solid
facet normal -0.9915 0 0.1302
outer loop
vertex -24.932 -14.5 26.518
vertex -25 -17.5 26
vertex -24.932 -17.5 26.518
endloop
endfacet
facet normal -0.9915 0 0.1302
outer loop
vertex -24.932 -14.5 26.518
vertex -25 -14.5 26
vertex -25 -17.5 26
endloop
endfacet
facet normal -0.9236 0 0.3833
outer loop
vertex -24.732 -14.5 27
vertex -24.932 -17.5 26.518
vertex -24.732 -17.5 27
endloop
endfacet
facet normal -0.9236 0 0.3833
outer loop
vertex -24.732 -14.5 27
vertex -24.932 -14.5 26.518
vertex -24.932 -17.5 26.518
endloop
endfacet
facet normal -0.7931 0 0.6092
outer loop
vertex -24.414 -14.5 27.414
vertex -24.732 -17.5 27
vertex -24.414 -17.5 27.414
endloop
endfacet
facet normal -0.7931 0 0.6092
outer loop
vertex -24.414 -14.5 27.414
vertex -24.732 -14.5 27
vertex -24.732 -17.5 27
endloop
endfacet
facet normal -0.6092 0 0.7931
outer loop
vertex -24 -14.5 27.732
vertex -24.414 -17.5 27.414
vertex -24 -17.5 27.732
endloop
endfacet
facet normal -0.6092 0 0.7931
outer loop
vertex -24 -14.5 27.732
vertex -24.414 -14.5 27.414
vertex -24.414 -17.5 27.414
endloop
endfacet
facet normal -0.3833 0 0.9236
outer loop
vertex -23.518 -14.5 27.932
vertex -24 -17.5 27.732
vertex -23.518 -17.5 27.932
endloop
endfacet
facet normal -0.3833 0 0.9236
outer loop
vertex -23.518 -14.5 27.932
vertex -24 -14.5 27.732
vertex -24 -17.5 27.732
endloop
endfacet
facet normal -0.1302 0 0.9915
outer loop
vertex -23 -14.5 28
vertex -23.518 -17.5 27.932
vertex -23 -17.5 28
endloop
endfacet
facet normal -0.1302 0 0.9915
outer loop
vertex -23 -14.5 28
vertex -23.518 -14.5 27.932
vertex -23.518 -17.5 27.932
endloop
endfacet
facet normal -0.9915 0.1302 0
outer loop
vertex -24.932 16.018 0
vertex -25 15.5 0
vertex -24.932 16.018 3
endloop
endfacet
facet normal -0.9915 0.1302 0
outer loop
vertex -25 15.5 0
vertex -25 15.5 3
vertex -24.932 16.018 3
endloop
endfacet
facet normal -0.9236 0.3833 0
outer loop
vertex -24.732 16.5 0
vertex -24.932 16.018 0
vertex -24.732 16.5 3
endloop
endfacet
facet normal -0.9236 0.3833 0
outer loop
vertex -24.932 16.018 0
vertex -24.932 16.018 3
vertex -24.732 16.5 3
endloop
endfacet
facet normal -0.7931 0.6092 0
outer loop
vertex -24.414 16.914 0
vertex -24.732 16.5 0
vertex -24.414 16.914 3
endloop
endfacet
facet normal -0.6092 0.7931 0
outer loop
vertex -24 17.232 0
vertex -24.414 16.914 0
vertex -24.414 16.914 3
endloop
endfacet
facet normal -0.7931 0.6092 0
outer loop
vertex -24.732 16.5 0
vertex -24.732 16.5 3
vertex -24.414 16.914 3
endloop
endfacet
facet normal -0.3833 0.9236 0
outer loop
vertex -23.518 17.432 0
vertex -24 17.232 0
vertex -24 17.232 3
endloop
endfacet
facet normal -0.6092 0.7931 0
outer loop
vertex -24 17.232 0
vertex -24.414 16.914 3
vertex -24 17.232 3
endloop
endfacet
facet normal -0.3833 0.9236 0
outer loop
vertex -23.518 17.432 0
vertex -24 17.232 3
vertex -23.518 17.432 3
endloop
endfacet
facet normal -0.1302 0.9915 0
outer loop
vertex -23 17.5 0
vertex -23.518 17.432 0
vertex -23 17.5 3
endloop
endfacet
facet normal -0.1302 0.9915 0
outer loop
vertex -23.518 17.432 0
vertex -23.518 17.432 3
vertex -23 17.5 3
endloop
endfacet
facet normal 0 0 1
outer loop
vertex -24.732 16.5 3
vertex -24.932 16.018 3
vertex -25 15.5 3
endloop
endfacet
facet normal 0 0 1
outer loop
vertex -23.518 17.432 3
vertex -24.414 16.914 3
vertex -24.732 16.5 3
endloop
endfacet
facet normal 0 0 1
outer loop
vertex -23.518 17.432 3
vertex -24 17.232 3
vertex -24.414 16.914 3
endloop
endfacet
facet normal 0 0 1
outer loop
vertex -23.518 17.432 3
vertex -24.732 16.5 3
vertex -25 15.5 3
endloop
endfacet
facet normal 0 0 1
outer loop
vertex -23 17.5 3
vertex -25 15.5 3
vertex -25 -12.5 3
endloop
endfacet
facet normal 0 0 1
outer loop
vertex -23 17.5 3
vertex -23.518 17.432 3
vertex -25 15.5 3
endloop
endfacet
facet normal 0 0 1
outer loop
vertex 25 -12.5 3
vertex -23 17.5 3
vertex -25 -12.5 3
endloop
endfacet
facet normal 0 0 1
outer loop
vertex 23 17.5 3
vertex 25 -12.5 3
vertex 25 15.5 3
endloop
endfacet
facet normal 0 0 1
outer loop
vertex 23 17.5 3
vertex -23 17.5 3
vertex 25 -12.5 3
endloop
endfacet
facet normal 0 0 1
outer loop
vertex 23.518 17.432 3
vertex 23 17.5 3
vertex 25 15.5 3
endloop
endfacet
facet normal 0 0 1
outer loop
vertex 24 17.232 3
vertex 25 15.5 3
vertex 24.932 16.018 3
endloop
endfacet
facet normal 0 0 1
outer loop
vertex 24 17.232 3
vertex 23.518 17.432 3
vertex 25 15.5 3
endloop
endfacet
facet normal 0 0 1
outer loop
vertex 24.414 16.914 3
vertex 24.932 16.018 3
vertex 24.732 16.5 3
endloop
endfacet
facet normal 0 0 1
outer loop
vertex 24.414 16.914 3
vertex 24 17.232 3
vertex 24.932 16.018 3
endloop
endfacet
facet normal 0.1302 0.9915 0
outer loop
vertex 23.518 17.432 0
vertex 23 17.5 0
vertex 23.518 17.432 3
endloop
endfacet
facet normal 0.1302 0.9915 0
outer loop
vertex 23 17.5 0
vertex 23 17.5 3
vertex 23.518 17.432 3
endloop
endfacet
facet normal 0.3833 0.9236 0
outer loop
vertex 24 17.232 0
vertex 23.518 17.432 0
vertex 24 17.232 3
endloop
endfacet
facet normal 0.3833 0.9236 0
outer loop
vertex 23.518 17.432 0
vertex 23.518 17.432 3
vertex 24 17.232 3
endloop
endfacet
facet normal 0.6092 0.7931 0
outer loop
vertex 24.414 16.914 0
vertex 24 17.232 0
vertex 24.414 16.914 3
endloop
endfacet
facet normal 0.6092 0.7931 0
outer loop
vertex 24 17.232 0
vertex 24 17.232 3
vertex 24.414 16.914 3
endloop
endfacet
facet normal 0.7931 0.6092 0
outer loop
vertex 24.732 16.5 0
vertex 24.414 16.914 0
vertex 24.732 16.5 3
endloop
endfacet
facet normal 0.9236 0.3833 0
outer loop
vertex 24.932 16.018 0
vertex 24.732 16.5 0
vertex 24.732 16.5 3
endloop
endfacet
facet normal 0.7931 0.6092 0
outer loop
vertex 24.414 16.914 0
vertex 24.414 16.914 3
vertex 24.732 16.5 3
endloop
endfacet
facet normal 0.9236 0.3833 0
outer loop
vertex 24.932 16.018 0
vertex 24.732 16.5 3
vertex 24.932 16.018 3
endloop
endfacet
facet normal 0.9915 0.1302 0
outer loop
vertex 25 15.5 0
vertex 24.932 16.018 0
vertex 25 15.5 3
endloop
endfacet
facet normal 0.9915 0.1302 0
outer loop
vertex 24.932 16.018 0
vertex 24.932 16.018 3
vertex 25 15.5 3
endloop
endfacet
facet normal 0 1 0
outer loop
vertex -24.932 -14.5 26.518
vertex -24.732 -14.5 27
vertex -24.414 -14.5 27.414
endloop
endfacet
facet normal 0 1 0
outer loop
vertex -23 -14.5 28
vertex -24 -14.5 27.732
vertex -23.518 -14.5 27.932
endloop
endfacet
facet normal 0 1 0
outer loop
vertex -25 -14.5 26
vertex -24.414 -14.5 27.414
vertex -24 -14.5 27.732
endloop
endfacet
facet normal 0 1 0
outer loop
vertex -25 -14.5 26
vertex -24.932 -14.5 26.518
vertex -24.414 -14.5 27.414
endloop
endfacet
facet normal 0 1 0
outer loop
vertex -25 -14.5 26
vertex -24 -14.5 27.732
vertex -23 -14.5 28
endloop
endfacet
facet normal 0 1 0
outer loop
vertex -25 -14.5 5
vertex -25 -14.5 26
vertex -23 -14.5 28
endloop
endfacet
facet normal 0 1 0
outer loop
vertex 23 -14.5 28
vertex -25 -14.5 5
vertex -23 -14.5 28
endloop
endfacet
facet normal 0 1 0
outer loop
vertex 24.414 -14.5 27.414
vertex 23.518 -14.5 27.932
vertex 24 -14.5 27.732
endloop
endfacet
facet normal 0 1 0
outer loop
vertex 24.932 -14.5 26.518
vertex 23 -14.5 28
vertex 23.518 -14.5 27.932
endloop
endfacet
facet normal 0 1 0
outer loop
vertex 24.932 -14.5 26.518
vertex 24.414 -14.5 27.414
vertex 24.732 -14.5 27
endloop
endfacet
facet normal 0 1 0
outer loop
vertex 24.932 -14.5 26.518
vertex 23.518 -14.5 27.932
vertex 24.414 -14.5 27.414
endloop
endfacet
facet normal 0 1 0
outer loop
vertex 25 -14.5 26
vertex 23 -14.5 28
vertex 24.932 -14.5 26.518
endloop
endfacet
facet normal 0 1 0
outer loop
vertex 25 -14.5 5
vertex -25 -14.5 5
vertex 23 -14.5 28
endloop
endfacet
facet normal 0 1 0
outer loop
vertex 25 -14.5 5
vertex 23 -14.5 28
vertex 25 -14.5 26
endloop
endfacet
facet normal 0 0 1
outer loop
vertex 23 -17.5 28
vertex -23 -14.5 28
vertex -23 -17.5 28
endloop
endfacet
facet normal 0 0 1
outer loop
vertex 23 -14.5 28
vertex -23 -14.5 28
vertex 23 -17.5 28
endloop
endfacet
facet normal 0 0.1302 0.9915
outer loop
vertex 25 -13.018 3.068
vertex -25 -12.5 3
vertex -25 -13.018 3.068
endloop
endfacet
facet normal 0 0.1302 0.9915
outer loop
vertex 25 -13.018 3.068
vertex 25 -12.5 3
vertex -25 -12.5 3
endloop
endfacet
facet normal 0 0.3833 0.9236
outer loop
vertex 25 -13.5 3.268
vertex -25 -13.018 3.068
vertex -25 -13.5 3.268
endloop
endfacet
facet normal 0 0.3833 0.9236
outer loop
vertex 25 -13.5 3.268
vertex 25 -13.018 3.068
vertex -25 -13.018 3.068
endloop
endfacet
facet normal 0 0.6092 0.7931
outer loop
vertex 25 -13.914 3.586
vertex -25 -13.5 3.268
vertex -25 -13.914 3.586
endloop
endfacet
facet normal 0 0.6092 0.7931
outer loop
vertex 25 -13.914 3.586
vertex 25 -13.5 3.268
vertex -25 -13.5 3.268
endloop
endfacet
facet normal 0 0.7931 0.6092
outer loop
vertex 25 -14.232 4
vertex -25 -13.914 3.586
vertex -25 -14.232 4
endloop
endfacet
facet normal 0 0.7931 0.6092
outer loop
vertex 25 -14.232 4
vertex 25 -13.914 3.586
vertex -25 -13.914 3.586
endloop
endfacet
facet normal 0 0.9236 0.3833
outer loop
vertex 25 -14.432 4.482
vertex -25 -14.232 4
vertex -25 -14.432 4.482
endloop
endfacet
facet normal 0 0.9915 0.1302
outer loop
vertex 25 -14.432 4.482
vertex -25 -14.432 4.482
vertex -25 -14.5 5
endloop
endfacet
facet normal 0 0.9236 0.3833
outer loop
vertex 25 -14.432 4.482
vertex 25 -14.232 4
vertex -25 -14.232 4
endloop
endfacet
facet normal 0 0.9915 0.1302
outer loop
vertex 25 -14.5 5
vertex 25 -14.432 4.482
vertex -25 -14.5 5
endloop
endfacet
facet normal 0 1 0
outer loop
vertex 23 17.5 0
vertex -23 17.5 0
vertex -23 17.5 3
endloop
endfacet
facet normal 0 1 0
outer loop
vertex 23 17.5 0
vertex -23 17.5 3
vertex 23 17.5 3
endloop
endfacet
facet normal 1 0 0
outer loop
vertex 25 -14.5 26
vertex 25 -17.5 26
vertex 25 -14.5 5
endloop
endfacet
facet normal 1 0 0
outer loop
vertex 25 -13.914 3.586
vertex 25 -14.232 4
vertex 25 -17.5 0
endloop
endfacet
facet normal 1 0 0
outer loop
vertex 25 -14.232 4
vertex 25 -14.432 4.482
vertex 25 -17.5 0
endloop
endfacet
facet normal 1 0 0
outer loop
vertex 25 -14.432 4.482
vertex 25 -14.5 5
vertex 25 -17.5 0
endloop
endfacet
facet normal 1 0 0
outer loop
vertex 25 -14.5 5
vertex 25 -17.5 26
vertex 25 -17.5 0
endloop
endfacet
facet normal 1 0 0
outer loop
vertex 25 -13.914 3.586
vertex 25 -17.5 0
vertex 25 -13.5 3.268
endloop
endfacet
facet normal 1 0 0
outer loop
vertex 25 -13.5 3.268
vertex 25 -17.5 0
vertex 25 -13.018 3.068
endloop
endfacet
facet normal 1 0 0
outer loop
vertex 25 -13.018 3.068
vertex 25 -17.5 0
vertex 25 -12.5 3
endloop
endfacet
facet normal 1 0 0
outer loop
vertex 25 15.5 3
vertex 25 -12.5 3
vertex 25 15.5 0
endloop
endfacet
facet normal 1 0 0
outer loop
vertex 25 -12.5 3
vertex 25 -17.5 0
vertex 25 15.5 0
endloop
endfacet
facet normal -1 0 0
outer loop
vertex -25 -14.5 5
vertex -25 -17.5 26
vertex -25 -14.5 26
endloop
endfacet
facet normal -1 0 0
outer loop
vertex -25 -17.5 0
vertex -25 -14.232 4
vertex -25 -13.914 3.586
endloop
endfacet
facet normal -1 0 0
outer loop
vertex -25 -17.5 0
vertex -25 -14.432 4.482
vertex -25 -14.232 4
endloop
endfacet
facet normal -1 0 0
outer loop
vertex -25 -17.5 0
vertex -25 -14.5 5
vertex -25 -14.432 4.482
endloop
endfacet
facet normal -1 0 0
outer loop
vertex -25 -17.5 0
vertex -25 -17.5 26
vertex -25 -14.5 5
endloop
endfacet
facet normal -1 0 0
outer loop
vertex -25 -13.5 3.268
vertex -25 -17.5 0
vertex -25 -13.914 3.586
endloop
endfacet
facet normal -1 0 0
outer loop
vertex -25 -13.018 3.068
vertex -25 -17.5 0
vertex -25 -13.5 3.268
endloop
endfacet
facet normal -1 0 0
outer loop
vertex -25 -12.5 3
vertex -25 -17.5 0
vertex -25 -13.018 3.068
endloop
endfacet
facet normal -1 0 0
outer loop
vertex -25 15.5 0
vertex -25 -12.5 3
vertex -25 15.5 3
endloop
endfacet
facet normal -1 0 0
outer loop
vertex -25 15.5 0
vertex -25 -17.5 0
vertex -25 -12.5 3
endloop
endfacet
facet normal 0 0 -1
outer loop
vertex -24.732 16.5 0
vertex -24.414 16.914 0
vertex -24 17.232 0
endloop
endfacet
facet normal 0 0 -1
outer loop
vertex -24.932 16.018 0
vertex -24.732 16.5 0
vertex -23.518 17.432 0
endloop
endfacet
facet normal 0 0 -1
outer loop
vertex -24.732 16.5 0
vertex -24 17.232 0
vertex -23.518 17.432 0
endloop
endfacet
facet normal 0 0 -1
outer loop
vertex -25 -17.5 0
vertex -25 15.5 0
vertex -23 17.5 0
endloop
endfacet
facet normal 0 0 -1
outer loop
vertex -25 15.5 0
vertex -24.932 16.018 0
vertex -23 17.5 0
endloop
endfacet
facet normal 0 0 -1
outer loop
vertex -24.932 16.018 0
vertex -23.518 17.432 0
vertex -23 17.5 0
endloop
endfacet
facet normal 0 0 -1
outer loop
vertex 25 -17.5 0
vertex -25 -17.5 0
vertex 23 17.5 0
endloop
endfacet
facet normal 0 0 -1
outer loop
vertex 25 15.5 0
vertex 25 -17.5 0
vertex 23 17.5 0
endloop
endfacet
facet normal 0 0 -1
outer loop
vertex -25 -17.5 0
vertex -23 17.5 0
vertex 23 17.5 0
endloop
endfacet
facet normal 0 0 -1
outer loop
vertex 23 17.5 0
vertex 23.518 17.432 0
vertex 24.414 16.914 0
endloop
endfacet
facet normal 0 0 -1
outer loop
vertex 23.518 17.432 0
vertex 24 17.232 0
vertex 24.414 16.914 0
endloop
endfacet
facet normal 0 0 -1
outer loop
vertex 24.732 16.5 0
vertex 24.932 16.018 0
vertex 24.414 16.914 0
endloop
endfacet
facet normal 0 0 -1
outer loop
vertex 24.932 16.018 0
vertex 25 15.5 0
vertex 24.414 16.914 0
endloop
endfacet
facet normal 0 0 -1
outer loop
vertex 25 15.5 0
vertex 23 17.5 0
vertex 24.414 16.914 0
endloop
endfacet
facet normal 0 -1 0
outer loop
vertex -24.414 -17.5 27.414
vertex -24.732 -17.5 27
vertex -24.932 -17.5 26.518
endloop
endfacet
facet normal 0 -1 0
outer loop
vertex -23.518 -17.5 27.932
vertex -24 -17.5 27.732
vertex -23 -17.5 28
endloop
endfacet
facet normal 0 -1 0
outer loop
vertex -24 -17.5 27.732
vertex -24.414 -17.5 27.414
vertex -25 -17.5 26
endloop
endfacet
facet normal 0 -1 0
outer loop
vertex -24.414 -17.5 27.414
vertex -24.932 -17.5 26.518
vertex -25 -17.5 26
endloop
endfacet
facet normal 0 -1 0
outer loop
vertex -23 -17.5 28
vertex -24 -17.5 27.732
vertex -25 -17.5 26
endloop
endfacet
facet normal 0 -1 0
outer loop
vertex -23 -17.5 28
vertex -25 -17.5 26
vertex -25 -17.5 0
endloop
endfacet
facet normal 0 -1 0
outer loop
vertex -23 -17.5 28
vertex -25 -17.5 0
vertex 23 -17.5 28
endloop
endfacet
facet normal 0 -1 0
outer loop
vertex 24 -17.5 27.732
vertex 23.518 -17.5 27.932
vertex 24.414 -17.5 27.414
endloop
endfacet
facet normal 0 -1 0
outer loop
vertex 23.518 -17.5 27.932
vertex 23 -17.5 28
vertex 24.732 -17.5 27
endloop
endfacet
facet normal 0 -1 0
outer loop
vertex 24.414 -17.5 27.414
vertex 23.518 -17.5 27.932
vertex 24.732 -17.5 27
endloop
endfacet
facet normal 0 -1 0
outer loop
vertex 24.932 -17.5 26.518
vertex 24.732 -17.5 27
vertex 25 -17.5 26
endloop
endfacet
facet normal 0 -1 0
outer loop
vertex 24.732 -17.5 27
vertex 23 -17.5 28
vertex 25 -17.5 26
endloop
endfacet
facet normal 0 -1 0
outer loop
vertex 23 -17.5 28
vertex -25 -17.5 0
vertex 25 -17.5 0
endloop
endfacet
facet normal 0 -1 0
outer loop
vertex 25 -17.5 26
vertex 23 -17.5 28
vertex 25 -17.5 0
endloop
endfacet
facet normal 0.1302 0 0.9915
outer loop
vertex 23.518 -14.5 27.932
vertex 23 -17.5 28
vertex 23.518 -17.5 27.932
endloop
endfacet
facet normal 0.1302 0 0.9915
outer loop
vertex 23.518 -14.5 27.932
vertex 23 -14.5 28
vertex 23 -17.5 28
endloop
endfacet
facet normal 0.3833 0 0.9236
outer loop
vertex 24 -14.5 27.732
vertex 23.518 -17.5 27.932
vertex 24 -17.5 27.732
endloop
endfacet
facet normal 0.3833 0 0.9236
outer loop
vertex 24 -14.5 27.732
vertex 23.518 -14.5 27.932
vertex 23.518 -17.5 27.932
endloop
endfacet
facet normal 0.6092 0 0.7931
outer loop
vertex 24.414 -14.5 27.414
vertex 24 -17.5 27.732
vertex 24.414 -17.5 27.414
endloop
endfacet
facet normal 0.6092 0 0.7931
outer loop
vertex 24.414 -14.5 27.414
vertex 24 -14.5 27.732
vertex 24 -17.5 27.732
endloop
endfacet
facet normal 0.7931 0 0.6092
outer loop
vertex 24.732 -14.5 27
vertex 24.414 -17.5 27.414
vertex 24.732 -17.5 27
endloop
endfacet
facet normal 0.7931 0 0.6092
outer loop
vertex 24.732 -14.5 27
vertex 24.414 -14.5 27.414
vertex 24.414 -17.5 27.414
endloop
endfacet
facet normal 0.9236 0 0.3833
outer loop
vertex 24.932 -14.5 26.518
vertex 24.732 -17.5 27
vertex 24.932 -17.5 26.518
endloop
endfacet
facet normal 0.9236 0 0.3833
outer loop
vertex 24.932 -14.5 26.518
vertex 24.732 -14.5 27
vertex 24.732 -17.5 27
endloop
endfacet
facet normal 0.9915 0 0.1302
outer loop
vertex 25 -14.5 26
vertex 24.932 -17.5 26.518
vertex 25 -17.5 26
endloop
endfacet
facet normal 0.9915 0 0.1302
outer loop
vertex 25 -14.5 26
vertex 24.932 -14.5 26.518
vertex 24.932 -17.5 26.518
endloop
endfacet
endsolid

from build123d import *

# Parameters (mm, degrees)
SKETCH1_W           = 50
SKETCH1_H           = 35
BOSS_EXTRUDE1_DEPTH = 3
SKETCH3_W           = 50
SKETCH3_H           = 3
BOSS_EXTRUDE2_DEPTH = 25
FILLET1_R           = 2
FILLET2_R           = 2


with BuildPart() as part:
    # Sketch1 → Boss-Extrude1 (new body)
    with BuildSketch(Plane.XY):
        Rectangle(SKETCH1_W, SKETCH1_H)
    extrude(amount=BOSS_EXTRUDE1_DEPTH)

    # Sketch3 → Boss-Extrude2 (add)
    with BuildSketch(Plane.XY.offset(3)):
        with Locations((0, -16)):
            Rectangle(SKETCH3_W, SKETCH3_H)
    extrude(amount=BOSS_EXTRUDE2_DEPTH)

    # Fillet1
    fillet1_edges = [part.edges().sort_by_distance(p)[0] for p in [
        (0, -14.5, 3),
    ]]
    fillet(fillet1_edges, radius=FILLET1_R)

    # Fillet2
    fillet2_edges = [part.edges().sort_by_distance(p)[0] for p in [
        (-25, -16, 28),
        (25, -16, 28),
        (-25, 17.5, 1.5),
        (25, 17.5, 1.5),
    ]]
    fillet(fillet2_edges, radius=FILLET2_R)


solid = part.part
